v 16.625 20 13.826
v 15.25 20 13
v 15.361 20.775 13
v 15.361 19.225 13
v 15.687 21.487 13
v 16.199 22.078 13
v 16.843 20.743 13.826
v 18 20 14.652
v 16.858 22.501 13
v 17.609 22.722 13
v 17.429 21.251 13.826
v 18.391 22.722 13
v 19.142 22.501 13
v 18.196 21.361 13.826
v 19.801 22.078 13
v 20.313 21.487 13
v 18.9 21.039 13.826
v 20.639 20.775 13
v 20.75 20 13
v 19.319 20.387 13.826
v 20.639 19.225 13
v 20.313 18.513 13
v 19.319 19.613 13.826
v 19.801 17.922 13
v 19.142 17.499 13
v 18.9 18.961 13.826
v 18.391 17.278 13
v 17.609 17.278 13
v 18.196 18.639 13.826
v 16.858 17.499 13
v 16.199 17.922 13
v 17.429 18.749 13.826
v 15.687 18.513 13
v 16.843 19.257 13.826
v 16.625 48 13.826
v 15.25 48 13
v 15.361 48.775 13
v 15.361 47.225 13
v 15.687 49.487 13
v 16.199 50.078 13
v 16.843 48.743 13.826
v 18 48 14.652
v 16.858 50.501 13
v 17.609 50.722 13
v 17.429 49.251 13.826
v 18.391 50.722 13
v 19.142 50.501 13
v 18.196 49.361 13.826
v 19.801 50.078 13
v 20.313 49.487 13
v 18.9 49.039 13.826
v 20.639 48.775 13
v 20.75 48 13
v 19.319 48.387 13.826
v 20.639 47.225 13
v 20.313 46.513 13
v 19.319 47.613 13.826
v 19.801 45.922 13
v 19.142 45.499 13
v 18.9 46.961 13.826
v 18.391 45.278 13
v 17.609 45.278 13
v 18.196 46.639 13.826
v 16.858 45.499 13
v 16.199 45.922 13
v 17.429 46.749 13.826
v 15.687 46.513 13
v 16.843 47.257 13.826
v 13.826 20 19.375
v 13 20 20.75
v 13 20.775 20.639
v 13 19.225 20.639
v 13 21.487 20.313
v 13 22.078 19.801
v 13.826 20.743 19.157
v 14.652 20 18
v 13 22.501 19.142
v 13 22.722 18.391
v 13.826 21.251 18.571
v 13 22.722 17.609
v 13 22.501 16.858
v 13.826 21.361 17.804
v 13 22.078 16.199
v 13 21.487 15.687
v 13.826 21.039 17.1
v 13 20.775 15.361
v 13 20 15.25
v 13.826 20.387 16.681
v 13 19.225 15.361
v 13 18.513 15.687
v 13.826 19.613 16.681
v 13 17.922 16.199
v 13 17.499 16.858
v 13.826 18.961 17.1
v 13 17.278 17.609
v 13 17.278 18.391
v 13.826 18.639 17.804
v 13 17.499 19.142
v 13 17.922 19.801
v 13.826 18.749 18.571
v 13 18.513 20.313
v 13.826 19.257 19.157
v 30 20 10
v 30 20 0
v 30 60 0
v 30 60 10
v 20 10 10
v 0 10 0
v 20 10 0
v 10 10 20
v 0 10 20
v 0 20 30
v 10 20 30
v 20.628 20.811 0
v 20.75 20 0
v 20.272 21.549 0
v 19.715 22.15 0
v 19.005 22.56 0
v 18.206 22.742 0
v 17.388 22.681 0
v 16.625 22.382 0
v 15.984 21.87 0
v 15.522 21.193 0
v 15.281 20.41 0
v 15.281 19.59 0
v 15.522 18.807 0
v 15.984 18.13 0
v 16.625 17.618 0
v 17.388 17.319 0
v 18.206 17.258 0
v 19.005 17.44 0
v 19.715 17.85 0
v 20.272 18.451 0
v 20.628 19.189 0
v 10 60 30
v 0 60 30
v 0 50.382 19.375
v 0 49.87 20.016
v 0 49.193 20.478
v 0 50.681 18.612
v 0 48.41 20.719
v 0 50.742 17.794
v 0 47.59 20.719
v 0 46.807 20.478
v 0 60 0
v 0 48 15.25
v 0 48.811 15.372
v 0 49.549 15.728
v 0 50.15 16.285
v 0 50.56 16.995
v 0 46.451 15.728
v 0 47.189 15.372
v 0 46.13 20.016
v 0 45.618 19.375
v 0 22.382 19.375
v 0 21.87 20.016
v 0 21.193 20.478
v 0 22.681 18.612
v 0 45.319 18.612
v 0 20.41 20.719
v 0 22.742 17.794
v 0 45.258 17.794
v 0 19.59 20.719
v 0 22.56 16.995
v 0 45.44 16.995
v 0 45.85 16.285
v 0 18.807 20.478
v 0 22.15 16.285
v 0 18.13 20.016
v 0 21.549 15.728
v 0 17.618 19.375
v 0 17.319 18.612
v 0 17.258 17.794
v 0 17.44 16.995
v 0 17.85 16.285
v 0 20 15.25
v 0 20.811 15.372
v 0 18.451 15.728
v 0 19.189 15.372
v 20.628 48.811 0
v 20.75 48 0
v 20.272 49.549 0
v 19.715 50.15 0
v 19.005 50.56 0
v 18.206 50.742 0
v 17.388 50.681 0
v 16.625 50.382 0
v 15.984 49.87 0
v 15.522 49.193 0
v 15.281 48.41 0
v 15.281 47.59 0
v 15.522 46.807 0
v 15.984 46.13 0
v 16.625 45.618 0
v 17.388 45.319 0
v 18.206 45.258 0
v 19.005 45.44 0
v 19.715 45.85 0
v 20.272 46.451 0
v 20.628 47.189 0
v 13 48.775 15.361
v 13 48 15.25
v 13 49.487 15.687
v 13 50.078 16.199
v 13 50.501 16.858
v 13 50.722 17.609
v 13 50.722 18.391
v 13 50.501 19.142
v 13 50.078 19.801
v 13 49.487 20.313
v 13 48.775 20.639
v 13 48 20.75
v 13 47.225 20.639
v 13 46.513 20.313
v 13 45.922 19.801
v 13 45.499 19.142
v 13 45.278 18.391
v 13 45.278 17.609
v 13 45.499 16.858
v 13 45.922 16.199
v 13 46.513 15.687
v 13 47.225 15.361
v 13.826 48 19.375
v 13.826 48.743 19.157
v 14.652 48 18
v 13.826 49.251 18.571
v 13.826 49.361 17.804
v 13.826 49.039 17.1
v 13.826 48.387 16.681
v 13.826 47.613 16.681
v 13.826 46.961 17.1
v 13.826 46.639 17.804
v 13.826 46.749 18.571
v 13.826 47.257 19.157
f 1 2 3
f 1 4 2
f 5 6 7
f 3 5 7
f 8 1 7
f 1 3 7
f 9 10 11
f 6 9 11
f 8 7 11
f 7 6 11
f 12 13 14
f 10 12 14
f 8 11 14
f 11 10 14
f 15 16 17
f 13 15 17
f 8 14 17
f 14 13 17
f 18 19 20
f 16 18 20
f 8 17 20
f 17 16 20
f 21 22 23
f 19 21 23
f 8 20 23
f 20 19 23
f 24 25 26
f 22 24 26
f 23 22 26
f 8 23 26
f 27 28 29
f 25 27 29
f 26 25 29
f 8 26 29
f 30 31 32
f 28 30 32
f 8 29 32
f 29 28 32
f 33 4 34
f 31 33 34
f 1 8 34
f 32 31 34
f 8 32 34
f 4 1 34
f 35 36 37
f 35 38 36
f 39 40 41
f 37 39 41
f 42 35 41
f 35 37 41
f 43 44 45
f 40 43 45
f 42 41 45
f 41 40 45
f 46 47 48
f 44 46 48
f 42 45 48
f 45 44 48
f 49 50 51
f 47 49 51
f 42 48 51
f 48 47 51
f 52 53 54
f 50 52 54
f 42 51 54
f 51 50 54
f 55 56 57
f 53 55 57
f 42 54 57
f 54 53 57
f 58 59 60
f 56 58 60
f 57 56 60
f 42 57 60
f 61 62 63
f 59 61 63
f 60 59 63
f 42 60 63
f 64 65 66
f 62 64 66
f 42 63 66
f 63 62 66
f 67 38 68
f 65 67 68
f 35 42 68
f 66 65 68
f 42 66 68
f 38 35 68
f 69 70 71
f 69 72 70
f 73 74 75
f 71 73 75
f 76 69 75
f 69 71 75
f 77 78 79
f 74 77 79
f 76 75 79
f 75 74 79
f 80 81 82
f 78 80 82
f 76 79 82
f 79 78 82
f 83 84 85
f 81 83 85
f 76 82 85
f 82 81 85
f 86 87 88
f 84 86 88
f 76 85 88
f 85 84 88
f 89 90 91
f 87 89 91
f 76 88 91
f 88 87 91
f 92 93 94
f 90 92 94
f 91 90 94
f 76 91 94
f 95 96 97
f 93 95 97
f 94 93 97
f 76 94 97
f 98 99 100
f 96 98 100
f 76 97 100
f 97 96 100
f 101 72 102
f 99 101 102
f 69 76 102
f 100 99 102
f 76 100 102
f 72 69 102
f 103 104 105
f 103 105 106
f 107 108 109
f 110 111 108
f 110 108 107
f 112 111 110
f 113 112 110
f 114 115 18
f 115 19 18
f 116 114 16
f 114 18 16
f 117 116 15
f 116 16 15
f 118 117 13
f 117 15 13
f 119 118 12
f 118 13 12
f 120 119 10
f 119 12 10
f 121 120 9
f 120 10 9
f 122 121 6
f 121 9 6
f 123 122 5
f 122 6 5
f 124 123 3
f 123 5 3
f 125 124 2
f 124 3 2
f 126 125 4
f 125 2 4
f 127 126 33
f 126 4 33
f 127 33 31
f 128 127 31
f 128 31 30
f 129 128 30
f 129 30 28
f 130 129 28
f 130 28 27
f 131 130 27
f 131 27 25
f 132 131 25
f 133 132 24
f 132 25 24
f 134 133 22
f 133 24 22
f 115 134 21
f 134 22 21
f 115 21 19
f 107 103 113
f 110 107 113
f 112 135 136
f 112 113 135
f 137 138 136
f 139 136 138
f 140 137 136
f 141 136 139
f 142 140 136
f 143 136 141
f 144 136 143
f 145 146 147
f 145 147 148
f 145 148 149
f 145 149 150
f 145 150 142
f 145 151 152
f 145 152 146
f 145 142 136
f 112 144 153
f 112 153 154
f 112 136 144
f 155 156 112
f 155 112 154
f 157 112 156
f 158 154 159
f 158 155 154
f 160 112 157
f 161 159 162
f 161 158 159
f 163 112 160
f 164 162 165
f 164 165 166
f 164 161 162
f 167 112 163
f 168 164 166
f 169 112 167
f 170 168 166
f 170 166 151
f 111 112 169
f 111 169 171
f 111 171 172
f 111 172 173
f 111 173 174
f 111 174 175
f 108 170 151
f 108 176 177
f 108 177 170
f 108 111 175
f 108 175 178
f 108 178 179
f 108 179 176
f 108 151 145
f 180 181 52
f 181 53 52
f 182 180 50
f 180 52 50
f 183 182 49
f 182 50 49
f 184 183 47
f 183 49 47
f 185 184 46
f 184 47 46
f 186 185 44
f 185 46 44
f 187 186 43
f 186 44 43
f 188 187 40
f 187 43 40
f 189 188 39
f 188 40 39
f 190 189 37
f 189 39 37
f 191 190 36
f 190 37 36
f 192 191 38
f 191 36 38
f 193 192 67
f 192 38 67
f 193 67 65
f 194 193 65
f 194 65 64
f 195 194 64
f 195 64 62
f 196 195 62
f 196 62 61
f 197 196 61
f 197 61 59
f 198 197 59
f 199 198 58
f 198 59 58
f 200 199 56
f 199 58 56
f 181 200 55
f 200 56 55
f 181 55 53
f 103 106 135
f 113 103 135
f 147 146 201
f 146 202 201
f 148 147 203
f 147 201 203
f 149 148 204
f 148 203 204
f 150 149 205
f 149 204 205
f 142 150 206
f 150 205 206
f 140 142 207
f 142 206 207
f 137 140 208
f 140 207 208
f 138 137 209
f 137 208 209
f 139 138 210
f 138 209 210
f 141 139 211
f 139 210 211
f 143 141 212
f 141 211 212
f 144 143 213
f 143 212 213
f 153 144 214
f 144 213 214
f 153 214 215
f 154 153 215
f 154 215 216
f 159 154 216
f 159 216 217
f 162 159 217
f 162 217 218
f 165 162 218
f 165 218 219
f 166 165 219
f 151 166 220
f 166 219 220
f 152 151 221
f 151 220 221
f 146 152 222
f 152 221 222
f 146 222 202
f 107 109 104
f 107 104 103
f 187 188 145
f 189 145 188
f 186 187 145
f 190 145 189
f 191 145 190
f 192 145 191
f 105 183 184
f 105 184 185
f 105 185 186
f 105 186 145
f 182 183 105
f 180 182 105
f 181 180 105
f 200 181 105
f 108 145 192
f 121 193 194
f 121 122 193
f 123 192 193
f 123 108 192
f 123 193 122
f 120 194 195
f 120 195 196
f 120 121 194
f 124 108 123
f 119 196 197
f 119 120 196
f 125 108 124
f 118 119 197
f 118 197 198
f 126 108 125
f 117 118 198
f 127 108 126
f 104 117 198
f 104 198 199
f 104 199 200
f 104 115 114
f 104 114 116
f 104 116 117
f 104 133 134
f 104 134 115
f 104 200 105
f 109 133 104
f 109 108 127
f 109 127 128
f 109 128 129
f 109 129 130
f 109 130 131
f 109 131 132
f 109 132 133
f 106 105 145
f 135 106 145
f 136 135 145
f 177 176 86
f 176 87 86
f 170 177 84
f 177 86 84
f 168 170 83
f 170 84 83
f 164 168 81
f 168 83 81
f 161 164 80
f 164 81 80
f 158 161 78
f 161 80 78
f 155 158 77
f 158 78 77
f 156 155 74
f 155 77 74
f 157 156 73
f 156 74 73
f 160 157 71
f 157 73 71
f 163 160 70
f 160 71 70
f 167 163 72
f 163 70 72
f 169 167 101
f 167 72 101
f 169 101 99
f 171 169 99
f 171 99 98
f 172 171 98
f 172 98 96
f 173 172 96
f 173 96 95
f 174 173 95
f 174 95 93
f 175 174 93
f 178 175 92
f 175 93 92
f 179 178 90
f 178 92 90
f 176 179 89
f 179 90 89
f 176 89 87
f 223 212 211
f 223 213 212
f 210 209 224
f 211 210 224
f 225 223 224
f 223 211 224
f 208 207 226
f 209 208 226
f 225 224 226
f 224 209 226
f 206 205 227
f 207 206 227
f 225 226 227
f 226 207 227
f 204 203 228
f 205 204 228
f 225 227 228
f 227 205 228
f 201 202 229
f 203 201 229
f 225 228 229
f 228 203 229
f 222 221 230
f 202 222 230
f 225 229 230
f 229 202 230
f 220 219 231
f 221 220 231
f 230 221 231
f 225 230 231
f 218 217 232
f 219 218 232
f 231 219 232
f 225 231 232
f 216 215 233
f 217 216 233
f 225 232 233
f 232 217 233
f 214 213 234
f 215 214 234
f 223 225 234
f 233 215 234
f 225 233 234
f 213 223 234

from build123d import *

# Parameters (mm, degrees)
SCHIZZO1_W                   = 30
SCHIZZO1_H                   = 40
ESTRUSIONE_ESTRUSIONE1_DEPTH = 30
SMUSSO1_SIZE                 = 20
ESTRUSIONE_ESTRUSIONE2_DEPTH = 20
FORO_PER_VITE_M5_1_D         = 5.5
FORO_PER_VITE_M5_1_DEPTH     = 13
FORO_PER_VITE_M5_1_TIP       = 1.652366702
FORO_PER_VITE_M5_2_D         = 5.5
FORO_PER_VITE_M5_2_DEPTH     = 13
FORO_PER_VITE_M5_2_TIP       = 1.652366702
SCHIZZO6_W                   = 30
SCHIZZO6_H                   = 30
TAGLIO_ESTRUSIONE1_DEPTH     = 10


with BuildPart() as part:
    # Schizzo1 → Estrusione-Estrusione1 (new body)
    with BuildSketch(Plane.XY):
        with Locations((15, 20)):
            Rectangle(SCHIZZO1_W, SCHIZZO1_H)
    extrude(amount=ESTRUSIONE_ESTRUSIONE1_DEPTH)

    # Smusso1
    smusso1_edges = [part.edges().sort_by_distance(p)[0] for p in [
        (30, 20, 30),
        (30, 0, 15),
        (15, 0, 30),
    ]]
    chamfer(smusso1_edges, length=SMUSSO1_SIZE)

    # Schizzo2 → Estrusione-Estrusione2 (add)
    with BuildSketch(Plane(origin=(0, 40, 0), x_dir=(1, 0, 0), z_dir=(0, 1, 0))):
        Polygon((0, 0), (30, 0), (30, -10), (10, -30), (0, -30), align=None)
    extrude(amount=ESTRUSIONE_ESTRUSIONE2_DEPTH)

    # Foro per Vite M5-1
    with Locations(Plane.ZY):
        with Locations((18, 20), (18, 48)):
            Hole(FORO_PER_VITE_M5_1_D / 2, depth=FORO_PER_VITE_M5_1_DEPTH)
            with Locations((0, 0, -(FORO_PER_VITE_M5_1_DEPTH + FORO_PER_VITE_M5_1_TIP / 2))):  # 118° drill point
                Cone(0, FORO_PER_VITE_M5_1_D / 2, FORO_PER_VITE_M5_1_TIP, mode=Mode.SUBTRACT)

    # Foro per Vite M5-2
    with Locations(Plane(origin=(18, 20, 0), x_dir=(-1, 0, 0), z_dir=(0, 0, -1))):
        with Locations((0, 0), (0, 28)):
            Hole(FORO_PER_VITE_M5_2_D / 2, depth=FORO_PER_VITE_M5_2_DEPTH)
            with Locations((0, 0, -(FORO_PER_VITE_M5_2_DEPTH + FORO_PER_VITE_M5_2_TIP / 2))):  # 118° drill point
                Cone(0, FORO_PER_VITE_M5_2_D / 2, FORO_PER_VITE_M5_2_TIP, mode=Mode.SUBTRACT)

    # Schizzo6 → Taglio-Estrusione1 (cut)
    with BuildSketch(Plane.XZ):
        with Locations((15, 15)):
            Rectangle(SCHIZZO6_W, SCHIZZO6_H)
    extrude(amount=-TAGLIO_ESTRUSIONE1_DEPTH, mode=Mode.SUBTRACT)


solid = part.part
